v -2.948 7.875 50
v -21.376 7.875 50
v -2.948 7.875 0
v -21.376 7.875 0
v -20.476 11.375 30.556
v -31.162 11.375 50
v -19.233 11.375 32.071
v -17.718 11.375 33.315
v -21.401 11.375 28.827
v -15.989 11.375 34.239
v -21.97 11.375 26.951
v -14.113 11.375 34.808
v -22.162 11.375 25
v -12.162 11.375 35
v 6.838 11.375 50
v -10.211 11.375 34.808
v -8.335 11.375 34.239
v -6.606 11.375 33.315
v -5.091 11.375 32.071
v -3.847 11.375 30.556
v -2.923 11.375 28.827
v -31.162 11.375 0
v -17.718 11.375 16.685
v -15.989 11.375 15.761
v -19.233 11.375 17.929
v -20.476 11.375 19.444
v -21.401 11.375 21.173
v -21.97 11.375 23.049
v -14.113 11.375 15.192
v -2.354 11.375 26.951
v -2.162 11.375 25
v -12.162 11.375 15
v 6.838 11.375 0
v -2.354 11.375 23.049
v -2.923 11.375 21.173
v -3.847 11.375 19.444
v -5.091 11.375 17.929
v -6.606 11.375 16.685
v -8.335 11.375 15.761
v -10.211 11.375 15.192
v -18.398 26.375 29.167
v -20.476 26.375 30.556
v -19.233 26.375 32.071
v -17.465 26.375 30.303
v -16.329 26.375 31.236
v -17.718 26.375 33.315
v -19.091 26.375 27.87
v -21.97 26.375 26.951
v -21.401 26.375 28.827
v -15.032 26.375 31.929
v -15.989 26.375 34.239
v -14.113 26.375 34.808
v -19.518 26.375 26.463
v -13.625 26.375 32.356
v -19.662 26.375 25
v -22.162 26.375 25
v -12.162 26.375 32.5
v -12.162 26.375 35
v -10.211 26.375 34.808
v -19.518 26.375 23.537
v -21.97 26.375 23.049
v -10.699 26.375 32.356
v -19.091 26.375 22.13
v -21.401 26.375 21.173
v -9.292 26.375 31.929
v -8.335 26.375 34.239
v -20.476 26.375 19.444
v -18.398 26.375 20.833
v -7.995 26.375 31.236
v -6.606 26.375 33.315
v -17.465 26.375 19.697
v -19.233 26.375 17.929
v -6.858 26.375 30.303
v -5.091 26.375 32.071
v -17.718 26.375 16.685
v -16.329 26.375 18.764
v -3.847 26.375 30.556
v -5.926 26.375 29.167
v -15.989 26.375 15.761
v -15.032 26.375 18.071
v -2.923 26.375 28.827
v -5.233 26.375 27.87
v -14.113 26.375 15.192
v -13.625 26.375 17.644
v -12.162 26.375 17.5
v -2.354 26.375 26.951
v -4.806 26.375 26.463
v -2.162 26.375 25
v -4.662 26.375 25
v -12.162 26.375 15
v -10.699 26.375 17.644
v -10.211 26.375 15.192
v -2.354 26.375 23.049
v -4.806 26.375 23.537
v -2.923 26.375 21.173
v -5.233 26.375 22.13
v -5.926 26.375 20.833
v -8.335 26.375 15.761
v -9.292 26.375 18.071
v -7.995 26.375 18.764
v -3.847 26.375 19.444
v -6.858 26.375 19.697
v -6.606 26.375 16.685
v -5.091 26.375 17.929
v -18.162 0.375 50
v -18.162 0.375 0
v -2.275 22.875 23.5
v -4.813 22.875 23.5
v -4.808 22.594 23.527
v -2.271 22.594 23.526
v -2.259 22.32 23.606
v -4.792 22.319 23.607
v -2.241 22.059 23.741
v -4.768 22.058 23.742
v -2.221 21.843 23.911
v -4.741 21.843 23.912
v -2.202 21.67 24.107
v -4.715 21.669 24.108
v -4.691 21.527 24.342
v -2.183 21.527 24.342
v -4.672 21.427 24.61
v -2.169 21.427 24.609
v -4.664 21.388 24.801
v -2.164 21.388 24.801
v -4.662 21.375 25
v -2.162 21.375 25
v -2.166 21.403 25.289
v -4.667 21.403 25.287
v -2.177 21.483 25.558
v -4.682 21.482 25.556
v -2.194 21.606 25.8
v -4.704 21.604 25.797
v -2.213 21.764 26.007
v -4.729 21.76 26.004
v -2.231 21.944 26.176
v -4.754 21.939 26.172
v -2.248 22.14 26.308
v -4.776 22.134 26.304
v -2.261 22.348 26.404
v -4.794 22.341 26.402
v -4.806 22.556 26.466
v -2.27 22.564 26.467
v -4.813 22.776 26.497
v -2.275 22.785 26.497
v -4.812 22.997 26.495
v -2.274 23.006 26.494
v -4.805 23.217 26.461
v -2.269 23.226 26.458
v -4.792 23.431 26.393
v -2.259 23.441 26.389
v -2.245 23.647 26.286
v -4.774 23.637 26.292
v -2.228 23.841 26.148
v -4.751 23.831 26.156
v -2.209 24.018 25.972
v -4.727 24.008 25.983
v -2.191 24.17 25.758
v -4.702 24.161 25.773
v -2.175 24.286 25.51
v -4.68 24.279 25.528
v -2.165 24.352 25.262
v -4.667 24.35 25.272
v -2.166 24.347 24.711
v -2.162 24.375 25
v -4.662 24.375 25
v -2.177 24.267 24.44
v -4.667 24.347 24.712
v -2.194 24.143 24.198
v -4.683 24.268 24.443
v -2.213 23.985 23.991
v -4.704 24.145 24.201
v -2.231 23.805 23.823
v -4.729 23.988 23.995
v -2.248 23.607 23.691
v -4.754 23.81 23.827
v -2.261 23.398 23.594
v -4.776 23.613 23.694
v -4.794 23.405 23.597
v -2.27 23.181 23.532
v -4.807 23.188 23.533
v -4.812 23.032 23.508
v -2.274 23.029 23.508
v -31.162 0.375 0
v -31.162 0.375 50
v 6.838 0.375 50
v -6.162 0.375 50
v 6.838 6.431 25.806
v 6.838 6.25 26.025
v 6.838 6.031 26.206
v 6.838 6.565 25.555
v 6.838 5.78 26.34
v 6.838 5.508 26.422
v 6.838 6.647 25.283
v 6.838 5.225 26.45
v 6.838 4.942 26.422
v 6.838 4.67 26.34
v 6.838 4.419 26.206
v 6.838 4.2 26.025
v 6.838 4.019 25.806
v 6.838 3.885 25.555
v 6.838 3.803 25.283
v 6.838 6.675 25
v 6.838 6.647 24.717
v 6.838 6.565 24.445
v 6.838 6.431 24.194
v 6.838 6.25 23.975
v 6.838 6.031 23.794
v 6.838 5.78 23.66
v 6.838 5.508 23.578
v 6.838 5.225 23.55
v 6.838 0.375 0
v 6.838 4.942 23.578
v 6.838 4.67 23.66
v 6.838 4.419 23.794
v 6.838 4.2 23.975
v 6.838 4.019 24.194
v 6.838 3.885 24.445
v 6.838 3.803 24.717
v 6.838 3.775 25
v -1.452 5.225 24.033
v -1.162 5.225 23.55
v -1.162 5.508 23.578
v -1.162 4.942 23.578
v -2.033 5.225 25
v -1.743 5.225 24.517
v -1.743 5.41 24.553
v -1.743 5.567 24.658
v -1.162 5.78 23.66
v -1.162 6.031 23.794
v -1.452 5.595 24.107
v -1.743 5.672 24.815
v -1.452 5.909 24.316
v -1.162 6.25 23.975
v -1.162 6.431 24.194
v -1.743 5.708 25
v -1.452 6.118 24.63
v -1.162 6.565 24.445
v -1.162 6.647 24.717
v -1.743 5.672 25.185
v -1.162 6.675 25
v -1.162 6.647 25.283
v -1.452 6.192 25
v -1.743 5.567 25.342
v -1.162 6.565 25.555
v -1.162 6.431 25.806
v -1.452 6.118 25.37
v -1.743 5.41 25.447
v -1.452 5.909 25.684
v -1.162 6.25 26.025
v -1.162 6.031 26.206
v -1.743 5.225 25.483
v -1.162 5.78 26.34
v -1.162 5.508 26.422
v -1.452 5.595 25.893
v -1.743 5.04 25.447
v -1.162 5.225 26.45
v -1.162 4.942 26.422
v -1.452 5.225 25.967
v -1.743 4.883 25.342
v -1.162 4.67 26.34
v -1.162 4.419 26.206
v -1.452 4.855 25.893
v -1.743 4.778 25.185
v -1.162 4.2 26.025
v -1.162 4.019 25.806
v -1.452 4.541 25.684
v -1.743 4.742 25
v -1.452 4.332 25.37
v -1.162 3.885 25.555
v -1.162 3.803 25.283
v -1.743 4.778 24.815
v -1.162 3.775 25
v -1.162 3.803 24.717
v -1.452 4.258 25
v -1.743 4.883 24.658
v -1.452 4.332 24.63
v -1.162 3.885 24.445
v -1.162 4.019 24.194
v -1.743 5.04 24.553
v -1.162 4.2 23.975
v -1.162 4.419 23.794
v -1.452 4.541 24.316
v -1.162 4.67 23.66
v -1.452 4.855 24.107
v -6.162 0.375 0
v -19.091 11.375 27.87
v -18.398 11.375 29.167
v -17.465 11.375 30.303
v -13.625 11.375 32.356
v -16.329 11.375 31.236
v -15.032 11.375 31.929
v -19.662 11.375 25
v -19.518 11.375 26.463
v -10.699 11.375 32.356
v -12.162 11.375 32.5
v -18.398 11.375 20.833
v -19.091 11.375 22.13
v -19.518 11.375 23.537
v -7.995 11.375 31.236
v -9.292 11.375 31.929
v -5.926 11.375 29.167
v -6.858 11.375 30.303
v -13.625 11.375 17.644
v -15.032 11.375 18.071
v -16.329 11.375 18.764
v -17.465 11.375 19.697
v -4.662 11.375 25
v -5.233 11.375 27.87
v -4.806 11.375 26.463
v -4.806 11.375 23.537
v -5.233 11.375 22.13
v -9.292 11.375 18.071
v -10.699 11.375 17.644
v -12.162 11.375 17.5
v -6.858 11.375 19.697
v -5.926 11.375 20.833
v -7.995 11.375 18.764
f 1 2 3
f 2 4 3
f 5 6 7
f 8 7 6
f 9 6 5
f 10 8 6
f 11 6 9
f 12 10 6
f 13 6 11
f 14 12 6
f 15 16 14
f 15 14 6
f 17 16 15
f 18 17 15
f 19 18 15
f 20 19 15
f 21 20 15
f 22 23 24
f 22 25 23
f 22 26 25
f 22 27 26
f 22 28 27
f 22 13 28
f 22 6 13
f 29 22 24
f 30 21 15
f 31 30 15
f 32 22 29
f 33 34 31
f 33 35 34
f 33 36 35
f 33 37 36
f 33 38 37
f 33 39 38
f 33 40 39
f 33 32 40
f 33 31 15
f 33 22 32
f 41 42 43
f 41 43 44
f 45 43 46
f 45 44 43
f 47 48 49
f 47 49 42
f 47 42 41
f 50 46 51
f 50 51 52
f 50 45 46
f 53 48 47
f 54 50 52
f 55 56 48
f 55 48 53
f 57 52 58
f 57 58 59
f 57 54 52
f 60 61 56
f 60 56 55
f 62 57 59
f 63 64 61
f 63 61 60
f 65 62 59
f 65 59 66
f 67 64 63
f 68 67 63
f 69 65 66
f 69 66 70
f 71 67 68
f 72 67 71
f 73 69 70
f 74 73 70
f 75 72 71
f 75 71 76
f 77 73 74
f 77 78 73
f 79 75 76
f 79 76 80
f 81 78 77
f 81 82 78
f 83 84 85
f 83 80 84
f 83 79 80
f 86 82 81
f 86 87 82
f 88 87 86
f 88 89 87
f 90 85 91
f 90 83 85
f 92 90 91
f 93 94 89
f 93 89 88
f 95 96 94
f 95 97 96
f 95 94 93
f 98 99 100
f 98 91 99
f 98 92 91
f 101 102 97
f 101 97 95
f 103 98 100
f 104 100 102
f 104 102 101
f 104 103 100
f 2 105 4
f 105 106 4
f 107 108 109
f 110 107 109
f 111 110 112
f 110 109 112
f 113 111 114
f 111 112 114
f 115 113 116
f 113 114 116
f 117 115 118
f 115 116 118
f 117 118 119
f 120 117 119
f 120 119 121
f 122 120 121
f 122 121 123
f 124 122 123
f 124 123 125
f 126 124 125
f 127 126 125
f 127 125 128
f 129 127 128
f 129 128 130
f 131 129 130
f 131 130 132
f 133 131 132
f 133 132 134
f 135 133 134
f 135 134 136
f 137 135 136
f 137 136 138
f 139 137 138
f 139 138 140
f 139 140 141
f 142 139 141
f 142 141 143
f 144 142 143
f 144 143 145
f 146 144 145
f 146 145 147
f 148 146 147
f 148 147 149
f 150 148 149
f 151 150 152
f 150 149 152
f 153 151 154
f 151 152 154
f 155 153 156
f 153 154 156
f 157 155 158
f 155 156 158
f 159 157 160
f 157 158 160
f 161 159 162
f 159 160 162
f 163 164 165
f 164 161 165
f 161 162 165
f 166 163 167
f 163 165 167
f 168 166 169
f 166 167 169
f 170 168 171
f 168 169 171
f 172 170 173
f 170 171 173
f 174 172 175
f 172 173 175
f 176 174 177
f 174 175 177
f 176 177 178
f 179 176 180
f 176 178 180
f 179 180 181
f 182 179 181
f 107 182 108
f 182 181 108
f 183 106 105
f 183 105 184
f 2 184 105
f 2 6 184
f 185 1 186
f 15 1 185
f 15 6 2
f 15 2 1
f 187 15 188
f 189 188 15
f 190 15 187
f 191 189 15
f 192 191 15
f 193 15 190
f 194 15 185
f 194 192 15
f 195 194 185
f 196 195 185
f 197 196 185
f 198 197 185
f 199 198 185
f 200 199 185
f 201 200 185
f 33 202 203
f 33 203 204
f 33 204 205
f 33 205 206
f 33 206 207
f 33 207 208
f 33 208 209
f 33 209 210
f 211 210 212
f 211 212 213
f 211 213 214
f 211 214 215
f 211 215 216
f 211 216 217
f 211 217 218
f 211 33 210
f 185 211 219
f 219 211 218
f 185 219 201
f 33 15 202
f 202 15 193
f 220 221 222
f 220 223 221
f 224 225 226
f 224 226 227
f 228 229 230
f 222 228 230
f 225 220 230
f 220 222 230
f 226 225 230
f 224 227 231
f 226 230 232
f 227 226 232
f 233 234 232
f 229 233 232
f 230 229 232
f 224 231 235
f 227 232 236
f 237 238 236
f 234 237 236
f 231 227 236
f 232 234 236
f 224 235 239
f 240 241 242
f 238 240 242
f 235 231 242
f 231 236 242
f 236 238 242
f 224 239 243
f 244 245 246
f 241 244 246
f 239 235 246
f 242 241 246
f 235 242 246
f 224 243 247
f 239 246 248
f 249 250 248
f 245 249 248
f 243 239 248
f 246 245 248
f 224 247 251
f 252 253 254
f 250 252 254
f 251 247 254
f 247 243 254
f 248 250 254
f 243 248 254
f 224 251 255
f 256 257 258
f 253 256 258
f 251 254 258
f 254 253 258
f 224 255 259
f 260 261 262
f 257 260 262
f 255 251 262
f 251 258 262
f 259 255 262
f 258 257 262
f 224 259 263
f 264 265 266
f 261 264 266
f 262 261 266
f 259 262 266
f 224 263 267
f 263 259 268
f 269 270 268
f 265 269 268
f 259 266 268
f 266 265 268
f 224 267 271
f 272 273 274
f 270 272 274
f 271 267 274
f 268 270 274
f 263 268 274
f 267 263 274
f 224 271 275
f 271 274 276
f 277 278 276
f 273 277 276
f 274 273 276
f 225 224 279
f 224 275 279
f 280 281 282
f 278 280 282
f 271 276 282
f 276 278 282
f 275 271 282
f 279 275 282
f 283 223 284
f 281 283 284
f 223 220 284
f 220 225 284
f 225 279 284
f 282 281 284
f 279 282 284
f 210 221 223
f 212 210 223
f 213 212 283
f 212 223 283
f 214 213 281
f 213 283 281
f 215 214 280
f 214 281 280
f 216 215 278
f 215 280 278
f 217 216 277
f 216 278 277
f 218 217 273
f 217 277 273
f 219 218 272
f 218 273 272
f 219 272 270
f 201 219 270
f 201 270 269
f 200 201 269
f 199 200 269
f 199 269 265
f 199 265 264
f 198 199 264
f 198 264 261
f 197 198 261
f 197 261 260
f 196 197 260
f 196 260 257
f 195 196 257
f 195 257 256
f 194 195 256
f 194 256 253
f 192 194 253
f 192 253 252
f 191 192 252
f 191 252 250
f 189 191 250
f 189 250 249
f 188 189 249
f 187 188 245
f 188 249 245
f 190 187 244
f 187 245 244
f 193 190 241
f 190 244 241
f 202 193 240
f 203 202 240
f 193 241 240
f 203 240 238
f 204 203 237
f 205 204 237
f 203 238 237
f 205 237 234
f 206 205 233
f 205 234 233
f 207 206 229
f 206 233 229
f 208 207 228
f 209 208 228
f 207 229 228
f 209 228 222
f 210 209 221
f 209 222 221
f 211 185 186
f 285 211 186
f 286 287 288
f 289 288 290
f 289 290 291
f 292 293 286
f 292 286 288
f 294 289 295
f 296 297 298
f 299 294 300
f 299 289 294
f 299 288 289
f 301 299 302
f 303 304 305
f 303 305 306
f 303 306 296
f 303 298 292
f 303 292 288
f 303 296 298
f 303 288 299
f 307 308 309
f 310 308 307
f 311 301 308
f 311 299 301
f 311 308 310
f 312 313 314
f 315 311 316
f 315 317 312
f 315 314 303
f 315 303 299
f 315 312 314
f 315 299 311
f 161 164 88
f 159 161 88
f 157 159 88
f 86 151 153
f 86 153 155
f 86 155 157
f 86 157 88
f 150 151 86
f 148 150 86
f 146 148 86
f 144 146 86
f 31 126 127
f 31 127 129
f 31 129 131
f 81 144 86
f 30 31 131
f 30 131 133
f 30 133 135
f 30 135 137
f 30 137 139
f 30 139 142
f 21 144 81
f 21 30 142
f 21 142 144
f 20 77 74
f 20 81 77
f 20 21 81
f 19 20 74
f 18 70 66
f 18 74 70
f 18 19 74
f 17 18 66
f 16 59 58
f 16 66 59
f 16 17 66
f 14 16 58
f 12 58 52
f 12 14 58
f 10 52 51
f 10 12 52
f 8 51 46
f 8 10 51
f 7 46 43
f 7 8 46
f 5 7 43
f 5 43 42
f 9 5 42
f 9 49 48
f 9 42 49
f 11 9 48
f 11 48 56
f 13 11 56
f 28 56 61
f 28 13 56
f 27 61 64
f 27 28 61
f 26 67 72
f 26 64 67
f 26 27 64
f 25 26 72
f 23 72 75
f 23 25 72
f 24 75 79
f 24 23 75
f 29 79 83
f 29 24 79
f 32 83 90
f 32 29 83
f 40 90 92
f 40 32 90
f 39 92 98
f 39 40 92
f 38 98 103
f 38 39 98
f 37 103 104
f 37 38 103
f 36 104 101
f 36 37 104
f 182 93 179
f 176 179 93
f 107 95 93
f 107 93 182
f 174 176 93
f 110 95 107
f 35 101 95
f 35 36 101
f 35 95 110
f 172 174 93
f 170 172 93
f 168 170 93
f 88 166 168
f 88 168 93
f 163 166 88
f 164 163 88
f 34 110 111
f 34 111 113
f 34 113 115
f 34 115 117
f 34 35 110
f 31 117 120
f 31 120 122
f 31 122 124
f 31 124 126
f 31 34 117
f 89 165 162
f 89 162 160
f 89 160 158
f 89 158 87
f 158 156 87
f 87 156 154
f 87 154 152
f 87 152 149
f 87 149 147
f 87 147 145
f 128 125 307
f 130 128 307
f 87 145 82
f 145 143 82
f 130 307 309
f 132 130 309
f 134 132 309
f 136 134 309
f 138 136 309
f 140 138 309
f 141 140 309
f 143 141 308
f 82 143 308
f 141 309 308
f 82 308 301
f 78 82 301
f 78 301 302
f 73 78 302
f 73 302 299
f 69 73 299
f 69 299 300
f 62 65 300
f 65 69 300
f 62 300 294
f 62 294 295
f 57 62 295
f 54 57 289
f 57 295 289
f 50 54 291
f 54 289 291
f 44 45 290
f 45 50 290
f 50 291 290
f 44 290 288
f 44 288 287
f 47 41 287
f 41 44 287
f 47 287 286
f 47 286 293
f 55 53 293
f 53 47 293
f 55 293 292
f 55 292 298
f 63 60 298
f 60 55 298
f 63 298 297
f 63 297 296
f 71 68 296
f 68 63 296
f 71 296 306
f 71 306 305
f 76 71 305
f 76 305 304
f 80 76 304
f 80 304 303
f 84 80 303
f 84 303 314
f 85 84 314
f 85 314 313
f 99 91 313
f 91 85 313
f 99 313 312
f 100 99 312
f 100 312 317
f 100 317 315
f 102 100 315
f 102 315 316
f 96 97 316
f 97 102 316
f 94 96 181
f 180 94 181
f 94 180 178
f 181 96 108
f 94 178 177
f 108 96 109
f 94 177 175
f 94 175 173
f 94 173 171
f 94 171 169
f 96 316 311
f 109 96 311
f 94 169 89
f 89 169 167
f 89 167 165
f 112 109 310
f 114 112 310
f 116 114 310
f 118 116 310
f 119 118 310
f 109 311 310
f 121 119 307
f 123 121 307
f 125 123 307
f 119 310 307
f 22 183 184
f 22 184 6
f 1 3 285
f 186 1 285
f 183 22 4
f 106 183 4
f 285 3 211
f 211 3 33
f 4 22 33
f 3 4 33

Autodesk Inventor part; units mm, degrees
ref_plane "YZ Plane" through (0, 0, 0) normal (1, 0, 0) x (0, 1, 0)
ref_plane "XZ Plane" through (0, 0, 0) normal (0, 1, 0) x (-1, 0, 0)
ref_plane "XY Plane" through (0, 0, 0) normal (0, 0, 1) x (1, 0, 0)
sketch "Skizze1" plane through (0, 0, 0) normal (0, 0, 1) x (1, 0, 0)
  line L0 (-18.1618, 0.375) -> (-21.3761, 7.875)
  line L1 (-2.9476, 7.875) -> (-6.1618, 0.375)
  line L2 (-6.1618, 0.375) -> (-18.1618, 0.375)
  line L3 (-18.1618, 0.375) -> (-31.1618, 0.375)
  line L4 (-31.1618, 0.375) -> (-31.1618, 11.375)
  line L5 (-31.1618, 11.375) -> (6.8382, 11.375)
  line L6 (6.8382, 11.375) -> (6.8382, 0.375)
  line L7 (6.8382, 0.375) -> (-6.1618, 0.375)
  line L8 (-21.5376, 7.875) -> (-2.9476, 7.875)
  point P0 (0, 0)
  point P1 (-21.1618, 7.375)
  point P2 (-3.1618, 7.375)
  dimension "d10" = 38
  dimension "d14" = 12
  dimension "d29" = 13
extrude "Extrusion1" add sketch "Skizze1" along normal blind 50 contours L3 L4 L5 L6 L7 L1 L8 L0
sketch "Skizze2" plane through (6.8382, 0.375, 0) normal (1, 0, 0) x (0, 0, -1)
  line L0 (-50, 0) -> (-50, 11) projected
  line L1 (0, 11) -> (-50, 11) projected
  point P0 (0, -0.375)
  point P1 (-25, 4.85)
  dimension "d19" = 6.15
hole "Bohrung1" at (6.8382, 5.225, 25) direction (-1, 0, 0) diameter 2.9 depth 8 tip angle 118
sketch "Skizze3" plane through (-21.3761, 7.875, 0) normal (0, -1, 0) x (1, 0, 0)
  line L0 (0, 50) -> (18.4286, 50) projected
  line L1 (28.2143, 0) -> (28.2143, 50) projected
  point P0 (21.3761, 0)
sketch "Skizze5" plane through (-31.1618, 11.375, 0) normal (0, 1, 0) x (1, 0, 0)
  line L0 (0, 0) -> (0, -50) projected
  line L1 (38, 0) -> (0, 0) projected
  circle A0 centre (19, -25) radius 7.5
  circle A1 centre (19, -25) radius 10
  point P0 (31.1618, 0)
  dimension "d39" = 19
  dimension "d40" = 25
  dimension "d41" = 15
  dimension "d42" = 20
extrude "Extrusion2" add sketch "Skizze5" along normal blind 15
ref_plane "Arbeitsebene1" through (-2.1618, 11.375, 25) normal (-1, 0, 0) x (0, -1, 0)
sketch "Skizze6" plane through (-2.1618, 11.375, 25) normal (-1, 0, 0) x (0, -1, 0)
  line L0 (-15, 10) -> (-15, -10) projected
  point P0 (11.375, -25)
  point P1 (-11.5, 0)
  dimension "d45" = 3.5
hole "Bohrung3" at (-2.1618, 22.875, 25) direction (-1, 0, 0) diameter 3 depth 8 tip angle 118
properties part number "7.1 Schlitten"
